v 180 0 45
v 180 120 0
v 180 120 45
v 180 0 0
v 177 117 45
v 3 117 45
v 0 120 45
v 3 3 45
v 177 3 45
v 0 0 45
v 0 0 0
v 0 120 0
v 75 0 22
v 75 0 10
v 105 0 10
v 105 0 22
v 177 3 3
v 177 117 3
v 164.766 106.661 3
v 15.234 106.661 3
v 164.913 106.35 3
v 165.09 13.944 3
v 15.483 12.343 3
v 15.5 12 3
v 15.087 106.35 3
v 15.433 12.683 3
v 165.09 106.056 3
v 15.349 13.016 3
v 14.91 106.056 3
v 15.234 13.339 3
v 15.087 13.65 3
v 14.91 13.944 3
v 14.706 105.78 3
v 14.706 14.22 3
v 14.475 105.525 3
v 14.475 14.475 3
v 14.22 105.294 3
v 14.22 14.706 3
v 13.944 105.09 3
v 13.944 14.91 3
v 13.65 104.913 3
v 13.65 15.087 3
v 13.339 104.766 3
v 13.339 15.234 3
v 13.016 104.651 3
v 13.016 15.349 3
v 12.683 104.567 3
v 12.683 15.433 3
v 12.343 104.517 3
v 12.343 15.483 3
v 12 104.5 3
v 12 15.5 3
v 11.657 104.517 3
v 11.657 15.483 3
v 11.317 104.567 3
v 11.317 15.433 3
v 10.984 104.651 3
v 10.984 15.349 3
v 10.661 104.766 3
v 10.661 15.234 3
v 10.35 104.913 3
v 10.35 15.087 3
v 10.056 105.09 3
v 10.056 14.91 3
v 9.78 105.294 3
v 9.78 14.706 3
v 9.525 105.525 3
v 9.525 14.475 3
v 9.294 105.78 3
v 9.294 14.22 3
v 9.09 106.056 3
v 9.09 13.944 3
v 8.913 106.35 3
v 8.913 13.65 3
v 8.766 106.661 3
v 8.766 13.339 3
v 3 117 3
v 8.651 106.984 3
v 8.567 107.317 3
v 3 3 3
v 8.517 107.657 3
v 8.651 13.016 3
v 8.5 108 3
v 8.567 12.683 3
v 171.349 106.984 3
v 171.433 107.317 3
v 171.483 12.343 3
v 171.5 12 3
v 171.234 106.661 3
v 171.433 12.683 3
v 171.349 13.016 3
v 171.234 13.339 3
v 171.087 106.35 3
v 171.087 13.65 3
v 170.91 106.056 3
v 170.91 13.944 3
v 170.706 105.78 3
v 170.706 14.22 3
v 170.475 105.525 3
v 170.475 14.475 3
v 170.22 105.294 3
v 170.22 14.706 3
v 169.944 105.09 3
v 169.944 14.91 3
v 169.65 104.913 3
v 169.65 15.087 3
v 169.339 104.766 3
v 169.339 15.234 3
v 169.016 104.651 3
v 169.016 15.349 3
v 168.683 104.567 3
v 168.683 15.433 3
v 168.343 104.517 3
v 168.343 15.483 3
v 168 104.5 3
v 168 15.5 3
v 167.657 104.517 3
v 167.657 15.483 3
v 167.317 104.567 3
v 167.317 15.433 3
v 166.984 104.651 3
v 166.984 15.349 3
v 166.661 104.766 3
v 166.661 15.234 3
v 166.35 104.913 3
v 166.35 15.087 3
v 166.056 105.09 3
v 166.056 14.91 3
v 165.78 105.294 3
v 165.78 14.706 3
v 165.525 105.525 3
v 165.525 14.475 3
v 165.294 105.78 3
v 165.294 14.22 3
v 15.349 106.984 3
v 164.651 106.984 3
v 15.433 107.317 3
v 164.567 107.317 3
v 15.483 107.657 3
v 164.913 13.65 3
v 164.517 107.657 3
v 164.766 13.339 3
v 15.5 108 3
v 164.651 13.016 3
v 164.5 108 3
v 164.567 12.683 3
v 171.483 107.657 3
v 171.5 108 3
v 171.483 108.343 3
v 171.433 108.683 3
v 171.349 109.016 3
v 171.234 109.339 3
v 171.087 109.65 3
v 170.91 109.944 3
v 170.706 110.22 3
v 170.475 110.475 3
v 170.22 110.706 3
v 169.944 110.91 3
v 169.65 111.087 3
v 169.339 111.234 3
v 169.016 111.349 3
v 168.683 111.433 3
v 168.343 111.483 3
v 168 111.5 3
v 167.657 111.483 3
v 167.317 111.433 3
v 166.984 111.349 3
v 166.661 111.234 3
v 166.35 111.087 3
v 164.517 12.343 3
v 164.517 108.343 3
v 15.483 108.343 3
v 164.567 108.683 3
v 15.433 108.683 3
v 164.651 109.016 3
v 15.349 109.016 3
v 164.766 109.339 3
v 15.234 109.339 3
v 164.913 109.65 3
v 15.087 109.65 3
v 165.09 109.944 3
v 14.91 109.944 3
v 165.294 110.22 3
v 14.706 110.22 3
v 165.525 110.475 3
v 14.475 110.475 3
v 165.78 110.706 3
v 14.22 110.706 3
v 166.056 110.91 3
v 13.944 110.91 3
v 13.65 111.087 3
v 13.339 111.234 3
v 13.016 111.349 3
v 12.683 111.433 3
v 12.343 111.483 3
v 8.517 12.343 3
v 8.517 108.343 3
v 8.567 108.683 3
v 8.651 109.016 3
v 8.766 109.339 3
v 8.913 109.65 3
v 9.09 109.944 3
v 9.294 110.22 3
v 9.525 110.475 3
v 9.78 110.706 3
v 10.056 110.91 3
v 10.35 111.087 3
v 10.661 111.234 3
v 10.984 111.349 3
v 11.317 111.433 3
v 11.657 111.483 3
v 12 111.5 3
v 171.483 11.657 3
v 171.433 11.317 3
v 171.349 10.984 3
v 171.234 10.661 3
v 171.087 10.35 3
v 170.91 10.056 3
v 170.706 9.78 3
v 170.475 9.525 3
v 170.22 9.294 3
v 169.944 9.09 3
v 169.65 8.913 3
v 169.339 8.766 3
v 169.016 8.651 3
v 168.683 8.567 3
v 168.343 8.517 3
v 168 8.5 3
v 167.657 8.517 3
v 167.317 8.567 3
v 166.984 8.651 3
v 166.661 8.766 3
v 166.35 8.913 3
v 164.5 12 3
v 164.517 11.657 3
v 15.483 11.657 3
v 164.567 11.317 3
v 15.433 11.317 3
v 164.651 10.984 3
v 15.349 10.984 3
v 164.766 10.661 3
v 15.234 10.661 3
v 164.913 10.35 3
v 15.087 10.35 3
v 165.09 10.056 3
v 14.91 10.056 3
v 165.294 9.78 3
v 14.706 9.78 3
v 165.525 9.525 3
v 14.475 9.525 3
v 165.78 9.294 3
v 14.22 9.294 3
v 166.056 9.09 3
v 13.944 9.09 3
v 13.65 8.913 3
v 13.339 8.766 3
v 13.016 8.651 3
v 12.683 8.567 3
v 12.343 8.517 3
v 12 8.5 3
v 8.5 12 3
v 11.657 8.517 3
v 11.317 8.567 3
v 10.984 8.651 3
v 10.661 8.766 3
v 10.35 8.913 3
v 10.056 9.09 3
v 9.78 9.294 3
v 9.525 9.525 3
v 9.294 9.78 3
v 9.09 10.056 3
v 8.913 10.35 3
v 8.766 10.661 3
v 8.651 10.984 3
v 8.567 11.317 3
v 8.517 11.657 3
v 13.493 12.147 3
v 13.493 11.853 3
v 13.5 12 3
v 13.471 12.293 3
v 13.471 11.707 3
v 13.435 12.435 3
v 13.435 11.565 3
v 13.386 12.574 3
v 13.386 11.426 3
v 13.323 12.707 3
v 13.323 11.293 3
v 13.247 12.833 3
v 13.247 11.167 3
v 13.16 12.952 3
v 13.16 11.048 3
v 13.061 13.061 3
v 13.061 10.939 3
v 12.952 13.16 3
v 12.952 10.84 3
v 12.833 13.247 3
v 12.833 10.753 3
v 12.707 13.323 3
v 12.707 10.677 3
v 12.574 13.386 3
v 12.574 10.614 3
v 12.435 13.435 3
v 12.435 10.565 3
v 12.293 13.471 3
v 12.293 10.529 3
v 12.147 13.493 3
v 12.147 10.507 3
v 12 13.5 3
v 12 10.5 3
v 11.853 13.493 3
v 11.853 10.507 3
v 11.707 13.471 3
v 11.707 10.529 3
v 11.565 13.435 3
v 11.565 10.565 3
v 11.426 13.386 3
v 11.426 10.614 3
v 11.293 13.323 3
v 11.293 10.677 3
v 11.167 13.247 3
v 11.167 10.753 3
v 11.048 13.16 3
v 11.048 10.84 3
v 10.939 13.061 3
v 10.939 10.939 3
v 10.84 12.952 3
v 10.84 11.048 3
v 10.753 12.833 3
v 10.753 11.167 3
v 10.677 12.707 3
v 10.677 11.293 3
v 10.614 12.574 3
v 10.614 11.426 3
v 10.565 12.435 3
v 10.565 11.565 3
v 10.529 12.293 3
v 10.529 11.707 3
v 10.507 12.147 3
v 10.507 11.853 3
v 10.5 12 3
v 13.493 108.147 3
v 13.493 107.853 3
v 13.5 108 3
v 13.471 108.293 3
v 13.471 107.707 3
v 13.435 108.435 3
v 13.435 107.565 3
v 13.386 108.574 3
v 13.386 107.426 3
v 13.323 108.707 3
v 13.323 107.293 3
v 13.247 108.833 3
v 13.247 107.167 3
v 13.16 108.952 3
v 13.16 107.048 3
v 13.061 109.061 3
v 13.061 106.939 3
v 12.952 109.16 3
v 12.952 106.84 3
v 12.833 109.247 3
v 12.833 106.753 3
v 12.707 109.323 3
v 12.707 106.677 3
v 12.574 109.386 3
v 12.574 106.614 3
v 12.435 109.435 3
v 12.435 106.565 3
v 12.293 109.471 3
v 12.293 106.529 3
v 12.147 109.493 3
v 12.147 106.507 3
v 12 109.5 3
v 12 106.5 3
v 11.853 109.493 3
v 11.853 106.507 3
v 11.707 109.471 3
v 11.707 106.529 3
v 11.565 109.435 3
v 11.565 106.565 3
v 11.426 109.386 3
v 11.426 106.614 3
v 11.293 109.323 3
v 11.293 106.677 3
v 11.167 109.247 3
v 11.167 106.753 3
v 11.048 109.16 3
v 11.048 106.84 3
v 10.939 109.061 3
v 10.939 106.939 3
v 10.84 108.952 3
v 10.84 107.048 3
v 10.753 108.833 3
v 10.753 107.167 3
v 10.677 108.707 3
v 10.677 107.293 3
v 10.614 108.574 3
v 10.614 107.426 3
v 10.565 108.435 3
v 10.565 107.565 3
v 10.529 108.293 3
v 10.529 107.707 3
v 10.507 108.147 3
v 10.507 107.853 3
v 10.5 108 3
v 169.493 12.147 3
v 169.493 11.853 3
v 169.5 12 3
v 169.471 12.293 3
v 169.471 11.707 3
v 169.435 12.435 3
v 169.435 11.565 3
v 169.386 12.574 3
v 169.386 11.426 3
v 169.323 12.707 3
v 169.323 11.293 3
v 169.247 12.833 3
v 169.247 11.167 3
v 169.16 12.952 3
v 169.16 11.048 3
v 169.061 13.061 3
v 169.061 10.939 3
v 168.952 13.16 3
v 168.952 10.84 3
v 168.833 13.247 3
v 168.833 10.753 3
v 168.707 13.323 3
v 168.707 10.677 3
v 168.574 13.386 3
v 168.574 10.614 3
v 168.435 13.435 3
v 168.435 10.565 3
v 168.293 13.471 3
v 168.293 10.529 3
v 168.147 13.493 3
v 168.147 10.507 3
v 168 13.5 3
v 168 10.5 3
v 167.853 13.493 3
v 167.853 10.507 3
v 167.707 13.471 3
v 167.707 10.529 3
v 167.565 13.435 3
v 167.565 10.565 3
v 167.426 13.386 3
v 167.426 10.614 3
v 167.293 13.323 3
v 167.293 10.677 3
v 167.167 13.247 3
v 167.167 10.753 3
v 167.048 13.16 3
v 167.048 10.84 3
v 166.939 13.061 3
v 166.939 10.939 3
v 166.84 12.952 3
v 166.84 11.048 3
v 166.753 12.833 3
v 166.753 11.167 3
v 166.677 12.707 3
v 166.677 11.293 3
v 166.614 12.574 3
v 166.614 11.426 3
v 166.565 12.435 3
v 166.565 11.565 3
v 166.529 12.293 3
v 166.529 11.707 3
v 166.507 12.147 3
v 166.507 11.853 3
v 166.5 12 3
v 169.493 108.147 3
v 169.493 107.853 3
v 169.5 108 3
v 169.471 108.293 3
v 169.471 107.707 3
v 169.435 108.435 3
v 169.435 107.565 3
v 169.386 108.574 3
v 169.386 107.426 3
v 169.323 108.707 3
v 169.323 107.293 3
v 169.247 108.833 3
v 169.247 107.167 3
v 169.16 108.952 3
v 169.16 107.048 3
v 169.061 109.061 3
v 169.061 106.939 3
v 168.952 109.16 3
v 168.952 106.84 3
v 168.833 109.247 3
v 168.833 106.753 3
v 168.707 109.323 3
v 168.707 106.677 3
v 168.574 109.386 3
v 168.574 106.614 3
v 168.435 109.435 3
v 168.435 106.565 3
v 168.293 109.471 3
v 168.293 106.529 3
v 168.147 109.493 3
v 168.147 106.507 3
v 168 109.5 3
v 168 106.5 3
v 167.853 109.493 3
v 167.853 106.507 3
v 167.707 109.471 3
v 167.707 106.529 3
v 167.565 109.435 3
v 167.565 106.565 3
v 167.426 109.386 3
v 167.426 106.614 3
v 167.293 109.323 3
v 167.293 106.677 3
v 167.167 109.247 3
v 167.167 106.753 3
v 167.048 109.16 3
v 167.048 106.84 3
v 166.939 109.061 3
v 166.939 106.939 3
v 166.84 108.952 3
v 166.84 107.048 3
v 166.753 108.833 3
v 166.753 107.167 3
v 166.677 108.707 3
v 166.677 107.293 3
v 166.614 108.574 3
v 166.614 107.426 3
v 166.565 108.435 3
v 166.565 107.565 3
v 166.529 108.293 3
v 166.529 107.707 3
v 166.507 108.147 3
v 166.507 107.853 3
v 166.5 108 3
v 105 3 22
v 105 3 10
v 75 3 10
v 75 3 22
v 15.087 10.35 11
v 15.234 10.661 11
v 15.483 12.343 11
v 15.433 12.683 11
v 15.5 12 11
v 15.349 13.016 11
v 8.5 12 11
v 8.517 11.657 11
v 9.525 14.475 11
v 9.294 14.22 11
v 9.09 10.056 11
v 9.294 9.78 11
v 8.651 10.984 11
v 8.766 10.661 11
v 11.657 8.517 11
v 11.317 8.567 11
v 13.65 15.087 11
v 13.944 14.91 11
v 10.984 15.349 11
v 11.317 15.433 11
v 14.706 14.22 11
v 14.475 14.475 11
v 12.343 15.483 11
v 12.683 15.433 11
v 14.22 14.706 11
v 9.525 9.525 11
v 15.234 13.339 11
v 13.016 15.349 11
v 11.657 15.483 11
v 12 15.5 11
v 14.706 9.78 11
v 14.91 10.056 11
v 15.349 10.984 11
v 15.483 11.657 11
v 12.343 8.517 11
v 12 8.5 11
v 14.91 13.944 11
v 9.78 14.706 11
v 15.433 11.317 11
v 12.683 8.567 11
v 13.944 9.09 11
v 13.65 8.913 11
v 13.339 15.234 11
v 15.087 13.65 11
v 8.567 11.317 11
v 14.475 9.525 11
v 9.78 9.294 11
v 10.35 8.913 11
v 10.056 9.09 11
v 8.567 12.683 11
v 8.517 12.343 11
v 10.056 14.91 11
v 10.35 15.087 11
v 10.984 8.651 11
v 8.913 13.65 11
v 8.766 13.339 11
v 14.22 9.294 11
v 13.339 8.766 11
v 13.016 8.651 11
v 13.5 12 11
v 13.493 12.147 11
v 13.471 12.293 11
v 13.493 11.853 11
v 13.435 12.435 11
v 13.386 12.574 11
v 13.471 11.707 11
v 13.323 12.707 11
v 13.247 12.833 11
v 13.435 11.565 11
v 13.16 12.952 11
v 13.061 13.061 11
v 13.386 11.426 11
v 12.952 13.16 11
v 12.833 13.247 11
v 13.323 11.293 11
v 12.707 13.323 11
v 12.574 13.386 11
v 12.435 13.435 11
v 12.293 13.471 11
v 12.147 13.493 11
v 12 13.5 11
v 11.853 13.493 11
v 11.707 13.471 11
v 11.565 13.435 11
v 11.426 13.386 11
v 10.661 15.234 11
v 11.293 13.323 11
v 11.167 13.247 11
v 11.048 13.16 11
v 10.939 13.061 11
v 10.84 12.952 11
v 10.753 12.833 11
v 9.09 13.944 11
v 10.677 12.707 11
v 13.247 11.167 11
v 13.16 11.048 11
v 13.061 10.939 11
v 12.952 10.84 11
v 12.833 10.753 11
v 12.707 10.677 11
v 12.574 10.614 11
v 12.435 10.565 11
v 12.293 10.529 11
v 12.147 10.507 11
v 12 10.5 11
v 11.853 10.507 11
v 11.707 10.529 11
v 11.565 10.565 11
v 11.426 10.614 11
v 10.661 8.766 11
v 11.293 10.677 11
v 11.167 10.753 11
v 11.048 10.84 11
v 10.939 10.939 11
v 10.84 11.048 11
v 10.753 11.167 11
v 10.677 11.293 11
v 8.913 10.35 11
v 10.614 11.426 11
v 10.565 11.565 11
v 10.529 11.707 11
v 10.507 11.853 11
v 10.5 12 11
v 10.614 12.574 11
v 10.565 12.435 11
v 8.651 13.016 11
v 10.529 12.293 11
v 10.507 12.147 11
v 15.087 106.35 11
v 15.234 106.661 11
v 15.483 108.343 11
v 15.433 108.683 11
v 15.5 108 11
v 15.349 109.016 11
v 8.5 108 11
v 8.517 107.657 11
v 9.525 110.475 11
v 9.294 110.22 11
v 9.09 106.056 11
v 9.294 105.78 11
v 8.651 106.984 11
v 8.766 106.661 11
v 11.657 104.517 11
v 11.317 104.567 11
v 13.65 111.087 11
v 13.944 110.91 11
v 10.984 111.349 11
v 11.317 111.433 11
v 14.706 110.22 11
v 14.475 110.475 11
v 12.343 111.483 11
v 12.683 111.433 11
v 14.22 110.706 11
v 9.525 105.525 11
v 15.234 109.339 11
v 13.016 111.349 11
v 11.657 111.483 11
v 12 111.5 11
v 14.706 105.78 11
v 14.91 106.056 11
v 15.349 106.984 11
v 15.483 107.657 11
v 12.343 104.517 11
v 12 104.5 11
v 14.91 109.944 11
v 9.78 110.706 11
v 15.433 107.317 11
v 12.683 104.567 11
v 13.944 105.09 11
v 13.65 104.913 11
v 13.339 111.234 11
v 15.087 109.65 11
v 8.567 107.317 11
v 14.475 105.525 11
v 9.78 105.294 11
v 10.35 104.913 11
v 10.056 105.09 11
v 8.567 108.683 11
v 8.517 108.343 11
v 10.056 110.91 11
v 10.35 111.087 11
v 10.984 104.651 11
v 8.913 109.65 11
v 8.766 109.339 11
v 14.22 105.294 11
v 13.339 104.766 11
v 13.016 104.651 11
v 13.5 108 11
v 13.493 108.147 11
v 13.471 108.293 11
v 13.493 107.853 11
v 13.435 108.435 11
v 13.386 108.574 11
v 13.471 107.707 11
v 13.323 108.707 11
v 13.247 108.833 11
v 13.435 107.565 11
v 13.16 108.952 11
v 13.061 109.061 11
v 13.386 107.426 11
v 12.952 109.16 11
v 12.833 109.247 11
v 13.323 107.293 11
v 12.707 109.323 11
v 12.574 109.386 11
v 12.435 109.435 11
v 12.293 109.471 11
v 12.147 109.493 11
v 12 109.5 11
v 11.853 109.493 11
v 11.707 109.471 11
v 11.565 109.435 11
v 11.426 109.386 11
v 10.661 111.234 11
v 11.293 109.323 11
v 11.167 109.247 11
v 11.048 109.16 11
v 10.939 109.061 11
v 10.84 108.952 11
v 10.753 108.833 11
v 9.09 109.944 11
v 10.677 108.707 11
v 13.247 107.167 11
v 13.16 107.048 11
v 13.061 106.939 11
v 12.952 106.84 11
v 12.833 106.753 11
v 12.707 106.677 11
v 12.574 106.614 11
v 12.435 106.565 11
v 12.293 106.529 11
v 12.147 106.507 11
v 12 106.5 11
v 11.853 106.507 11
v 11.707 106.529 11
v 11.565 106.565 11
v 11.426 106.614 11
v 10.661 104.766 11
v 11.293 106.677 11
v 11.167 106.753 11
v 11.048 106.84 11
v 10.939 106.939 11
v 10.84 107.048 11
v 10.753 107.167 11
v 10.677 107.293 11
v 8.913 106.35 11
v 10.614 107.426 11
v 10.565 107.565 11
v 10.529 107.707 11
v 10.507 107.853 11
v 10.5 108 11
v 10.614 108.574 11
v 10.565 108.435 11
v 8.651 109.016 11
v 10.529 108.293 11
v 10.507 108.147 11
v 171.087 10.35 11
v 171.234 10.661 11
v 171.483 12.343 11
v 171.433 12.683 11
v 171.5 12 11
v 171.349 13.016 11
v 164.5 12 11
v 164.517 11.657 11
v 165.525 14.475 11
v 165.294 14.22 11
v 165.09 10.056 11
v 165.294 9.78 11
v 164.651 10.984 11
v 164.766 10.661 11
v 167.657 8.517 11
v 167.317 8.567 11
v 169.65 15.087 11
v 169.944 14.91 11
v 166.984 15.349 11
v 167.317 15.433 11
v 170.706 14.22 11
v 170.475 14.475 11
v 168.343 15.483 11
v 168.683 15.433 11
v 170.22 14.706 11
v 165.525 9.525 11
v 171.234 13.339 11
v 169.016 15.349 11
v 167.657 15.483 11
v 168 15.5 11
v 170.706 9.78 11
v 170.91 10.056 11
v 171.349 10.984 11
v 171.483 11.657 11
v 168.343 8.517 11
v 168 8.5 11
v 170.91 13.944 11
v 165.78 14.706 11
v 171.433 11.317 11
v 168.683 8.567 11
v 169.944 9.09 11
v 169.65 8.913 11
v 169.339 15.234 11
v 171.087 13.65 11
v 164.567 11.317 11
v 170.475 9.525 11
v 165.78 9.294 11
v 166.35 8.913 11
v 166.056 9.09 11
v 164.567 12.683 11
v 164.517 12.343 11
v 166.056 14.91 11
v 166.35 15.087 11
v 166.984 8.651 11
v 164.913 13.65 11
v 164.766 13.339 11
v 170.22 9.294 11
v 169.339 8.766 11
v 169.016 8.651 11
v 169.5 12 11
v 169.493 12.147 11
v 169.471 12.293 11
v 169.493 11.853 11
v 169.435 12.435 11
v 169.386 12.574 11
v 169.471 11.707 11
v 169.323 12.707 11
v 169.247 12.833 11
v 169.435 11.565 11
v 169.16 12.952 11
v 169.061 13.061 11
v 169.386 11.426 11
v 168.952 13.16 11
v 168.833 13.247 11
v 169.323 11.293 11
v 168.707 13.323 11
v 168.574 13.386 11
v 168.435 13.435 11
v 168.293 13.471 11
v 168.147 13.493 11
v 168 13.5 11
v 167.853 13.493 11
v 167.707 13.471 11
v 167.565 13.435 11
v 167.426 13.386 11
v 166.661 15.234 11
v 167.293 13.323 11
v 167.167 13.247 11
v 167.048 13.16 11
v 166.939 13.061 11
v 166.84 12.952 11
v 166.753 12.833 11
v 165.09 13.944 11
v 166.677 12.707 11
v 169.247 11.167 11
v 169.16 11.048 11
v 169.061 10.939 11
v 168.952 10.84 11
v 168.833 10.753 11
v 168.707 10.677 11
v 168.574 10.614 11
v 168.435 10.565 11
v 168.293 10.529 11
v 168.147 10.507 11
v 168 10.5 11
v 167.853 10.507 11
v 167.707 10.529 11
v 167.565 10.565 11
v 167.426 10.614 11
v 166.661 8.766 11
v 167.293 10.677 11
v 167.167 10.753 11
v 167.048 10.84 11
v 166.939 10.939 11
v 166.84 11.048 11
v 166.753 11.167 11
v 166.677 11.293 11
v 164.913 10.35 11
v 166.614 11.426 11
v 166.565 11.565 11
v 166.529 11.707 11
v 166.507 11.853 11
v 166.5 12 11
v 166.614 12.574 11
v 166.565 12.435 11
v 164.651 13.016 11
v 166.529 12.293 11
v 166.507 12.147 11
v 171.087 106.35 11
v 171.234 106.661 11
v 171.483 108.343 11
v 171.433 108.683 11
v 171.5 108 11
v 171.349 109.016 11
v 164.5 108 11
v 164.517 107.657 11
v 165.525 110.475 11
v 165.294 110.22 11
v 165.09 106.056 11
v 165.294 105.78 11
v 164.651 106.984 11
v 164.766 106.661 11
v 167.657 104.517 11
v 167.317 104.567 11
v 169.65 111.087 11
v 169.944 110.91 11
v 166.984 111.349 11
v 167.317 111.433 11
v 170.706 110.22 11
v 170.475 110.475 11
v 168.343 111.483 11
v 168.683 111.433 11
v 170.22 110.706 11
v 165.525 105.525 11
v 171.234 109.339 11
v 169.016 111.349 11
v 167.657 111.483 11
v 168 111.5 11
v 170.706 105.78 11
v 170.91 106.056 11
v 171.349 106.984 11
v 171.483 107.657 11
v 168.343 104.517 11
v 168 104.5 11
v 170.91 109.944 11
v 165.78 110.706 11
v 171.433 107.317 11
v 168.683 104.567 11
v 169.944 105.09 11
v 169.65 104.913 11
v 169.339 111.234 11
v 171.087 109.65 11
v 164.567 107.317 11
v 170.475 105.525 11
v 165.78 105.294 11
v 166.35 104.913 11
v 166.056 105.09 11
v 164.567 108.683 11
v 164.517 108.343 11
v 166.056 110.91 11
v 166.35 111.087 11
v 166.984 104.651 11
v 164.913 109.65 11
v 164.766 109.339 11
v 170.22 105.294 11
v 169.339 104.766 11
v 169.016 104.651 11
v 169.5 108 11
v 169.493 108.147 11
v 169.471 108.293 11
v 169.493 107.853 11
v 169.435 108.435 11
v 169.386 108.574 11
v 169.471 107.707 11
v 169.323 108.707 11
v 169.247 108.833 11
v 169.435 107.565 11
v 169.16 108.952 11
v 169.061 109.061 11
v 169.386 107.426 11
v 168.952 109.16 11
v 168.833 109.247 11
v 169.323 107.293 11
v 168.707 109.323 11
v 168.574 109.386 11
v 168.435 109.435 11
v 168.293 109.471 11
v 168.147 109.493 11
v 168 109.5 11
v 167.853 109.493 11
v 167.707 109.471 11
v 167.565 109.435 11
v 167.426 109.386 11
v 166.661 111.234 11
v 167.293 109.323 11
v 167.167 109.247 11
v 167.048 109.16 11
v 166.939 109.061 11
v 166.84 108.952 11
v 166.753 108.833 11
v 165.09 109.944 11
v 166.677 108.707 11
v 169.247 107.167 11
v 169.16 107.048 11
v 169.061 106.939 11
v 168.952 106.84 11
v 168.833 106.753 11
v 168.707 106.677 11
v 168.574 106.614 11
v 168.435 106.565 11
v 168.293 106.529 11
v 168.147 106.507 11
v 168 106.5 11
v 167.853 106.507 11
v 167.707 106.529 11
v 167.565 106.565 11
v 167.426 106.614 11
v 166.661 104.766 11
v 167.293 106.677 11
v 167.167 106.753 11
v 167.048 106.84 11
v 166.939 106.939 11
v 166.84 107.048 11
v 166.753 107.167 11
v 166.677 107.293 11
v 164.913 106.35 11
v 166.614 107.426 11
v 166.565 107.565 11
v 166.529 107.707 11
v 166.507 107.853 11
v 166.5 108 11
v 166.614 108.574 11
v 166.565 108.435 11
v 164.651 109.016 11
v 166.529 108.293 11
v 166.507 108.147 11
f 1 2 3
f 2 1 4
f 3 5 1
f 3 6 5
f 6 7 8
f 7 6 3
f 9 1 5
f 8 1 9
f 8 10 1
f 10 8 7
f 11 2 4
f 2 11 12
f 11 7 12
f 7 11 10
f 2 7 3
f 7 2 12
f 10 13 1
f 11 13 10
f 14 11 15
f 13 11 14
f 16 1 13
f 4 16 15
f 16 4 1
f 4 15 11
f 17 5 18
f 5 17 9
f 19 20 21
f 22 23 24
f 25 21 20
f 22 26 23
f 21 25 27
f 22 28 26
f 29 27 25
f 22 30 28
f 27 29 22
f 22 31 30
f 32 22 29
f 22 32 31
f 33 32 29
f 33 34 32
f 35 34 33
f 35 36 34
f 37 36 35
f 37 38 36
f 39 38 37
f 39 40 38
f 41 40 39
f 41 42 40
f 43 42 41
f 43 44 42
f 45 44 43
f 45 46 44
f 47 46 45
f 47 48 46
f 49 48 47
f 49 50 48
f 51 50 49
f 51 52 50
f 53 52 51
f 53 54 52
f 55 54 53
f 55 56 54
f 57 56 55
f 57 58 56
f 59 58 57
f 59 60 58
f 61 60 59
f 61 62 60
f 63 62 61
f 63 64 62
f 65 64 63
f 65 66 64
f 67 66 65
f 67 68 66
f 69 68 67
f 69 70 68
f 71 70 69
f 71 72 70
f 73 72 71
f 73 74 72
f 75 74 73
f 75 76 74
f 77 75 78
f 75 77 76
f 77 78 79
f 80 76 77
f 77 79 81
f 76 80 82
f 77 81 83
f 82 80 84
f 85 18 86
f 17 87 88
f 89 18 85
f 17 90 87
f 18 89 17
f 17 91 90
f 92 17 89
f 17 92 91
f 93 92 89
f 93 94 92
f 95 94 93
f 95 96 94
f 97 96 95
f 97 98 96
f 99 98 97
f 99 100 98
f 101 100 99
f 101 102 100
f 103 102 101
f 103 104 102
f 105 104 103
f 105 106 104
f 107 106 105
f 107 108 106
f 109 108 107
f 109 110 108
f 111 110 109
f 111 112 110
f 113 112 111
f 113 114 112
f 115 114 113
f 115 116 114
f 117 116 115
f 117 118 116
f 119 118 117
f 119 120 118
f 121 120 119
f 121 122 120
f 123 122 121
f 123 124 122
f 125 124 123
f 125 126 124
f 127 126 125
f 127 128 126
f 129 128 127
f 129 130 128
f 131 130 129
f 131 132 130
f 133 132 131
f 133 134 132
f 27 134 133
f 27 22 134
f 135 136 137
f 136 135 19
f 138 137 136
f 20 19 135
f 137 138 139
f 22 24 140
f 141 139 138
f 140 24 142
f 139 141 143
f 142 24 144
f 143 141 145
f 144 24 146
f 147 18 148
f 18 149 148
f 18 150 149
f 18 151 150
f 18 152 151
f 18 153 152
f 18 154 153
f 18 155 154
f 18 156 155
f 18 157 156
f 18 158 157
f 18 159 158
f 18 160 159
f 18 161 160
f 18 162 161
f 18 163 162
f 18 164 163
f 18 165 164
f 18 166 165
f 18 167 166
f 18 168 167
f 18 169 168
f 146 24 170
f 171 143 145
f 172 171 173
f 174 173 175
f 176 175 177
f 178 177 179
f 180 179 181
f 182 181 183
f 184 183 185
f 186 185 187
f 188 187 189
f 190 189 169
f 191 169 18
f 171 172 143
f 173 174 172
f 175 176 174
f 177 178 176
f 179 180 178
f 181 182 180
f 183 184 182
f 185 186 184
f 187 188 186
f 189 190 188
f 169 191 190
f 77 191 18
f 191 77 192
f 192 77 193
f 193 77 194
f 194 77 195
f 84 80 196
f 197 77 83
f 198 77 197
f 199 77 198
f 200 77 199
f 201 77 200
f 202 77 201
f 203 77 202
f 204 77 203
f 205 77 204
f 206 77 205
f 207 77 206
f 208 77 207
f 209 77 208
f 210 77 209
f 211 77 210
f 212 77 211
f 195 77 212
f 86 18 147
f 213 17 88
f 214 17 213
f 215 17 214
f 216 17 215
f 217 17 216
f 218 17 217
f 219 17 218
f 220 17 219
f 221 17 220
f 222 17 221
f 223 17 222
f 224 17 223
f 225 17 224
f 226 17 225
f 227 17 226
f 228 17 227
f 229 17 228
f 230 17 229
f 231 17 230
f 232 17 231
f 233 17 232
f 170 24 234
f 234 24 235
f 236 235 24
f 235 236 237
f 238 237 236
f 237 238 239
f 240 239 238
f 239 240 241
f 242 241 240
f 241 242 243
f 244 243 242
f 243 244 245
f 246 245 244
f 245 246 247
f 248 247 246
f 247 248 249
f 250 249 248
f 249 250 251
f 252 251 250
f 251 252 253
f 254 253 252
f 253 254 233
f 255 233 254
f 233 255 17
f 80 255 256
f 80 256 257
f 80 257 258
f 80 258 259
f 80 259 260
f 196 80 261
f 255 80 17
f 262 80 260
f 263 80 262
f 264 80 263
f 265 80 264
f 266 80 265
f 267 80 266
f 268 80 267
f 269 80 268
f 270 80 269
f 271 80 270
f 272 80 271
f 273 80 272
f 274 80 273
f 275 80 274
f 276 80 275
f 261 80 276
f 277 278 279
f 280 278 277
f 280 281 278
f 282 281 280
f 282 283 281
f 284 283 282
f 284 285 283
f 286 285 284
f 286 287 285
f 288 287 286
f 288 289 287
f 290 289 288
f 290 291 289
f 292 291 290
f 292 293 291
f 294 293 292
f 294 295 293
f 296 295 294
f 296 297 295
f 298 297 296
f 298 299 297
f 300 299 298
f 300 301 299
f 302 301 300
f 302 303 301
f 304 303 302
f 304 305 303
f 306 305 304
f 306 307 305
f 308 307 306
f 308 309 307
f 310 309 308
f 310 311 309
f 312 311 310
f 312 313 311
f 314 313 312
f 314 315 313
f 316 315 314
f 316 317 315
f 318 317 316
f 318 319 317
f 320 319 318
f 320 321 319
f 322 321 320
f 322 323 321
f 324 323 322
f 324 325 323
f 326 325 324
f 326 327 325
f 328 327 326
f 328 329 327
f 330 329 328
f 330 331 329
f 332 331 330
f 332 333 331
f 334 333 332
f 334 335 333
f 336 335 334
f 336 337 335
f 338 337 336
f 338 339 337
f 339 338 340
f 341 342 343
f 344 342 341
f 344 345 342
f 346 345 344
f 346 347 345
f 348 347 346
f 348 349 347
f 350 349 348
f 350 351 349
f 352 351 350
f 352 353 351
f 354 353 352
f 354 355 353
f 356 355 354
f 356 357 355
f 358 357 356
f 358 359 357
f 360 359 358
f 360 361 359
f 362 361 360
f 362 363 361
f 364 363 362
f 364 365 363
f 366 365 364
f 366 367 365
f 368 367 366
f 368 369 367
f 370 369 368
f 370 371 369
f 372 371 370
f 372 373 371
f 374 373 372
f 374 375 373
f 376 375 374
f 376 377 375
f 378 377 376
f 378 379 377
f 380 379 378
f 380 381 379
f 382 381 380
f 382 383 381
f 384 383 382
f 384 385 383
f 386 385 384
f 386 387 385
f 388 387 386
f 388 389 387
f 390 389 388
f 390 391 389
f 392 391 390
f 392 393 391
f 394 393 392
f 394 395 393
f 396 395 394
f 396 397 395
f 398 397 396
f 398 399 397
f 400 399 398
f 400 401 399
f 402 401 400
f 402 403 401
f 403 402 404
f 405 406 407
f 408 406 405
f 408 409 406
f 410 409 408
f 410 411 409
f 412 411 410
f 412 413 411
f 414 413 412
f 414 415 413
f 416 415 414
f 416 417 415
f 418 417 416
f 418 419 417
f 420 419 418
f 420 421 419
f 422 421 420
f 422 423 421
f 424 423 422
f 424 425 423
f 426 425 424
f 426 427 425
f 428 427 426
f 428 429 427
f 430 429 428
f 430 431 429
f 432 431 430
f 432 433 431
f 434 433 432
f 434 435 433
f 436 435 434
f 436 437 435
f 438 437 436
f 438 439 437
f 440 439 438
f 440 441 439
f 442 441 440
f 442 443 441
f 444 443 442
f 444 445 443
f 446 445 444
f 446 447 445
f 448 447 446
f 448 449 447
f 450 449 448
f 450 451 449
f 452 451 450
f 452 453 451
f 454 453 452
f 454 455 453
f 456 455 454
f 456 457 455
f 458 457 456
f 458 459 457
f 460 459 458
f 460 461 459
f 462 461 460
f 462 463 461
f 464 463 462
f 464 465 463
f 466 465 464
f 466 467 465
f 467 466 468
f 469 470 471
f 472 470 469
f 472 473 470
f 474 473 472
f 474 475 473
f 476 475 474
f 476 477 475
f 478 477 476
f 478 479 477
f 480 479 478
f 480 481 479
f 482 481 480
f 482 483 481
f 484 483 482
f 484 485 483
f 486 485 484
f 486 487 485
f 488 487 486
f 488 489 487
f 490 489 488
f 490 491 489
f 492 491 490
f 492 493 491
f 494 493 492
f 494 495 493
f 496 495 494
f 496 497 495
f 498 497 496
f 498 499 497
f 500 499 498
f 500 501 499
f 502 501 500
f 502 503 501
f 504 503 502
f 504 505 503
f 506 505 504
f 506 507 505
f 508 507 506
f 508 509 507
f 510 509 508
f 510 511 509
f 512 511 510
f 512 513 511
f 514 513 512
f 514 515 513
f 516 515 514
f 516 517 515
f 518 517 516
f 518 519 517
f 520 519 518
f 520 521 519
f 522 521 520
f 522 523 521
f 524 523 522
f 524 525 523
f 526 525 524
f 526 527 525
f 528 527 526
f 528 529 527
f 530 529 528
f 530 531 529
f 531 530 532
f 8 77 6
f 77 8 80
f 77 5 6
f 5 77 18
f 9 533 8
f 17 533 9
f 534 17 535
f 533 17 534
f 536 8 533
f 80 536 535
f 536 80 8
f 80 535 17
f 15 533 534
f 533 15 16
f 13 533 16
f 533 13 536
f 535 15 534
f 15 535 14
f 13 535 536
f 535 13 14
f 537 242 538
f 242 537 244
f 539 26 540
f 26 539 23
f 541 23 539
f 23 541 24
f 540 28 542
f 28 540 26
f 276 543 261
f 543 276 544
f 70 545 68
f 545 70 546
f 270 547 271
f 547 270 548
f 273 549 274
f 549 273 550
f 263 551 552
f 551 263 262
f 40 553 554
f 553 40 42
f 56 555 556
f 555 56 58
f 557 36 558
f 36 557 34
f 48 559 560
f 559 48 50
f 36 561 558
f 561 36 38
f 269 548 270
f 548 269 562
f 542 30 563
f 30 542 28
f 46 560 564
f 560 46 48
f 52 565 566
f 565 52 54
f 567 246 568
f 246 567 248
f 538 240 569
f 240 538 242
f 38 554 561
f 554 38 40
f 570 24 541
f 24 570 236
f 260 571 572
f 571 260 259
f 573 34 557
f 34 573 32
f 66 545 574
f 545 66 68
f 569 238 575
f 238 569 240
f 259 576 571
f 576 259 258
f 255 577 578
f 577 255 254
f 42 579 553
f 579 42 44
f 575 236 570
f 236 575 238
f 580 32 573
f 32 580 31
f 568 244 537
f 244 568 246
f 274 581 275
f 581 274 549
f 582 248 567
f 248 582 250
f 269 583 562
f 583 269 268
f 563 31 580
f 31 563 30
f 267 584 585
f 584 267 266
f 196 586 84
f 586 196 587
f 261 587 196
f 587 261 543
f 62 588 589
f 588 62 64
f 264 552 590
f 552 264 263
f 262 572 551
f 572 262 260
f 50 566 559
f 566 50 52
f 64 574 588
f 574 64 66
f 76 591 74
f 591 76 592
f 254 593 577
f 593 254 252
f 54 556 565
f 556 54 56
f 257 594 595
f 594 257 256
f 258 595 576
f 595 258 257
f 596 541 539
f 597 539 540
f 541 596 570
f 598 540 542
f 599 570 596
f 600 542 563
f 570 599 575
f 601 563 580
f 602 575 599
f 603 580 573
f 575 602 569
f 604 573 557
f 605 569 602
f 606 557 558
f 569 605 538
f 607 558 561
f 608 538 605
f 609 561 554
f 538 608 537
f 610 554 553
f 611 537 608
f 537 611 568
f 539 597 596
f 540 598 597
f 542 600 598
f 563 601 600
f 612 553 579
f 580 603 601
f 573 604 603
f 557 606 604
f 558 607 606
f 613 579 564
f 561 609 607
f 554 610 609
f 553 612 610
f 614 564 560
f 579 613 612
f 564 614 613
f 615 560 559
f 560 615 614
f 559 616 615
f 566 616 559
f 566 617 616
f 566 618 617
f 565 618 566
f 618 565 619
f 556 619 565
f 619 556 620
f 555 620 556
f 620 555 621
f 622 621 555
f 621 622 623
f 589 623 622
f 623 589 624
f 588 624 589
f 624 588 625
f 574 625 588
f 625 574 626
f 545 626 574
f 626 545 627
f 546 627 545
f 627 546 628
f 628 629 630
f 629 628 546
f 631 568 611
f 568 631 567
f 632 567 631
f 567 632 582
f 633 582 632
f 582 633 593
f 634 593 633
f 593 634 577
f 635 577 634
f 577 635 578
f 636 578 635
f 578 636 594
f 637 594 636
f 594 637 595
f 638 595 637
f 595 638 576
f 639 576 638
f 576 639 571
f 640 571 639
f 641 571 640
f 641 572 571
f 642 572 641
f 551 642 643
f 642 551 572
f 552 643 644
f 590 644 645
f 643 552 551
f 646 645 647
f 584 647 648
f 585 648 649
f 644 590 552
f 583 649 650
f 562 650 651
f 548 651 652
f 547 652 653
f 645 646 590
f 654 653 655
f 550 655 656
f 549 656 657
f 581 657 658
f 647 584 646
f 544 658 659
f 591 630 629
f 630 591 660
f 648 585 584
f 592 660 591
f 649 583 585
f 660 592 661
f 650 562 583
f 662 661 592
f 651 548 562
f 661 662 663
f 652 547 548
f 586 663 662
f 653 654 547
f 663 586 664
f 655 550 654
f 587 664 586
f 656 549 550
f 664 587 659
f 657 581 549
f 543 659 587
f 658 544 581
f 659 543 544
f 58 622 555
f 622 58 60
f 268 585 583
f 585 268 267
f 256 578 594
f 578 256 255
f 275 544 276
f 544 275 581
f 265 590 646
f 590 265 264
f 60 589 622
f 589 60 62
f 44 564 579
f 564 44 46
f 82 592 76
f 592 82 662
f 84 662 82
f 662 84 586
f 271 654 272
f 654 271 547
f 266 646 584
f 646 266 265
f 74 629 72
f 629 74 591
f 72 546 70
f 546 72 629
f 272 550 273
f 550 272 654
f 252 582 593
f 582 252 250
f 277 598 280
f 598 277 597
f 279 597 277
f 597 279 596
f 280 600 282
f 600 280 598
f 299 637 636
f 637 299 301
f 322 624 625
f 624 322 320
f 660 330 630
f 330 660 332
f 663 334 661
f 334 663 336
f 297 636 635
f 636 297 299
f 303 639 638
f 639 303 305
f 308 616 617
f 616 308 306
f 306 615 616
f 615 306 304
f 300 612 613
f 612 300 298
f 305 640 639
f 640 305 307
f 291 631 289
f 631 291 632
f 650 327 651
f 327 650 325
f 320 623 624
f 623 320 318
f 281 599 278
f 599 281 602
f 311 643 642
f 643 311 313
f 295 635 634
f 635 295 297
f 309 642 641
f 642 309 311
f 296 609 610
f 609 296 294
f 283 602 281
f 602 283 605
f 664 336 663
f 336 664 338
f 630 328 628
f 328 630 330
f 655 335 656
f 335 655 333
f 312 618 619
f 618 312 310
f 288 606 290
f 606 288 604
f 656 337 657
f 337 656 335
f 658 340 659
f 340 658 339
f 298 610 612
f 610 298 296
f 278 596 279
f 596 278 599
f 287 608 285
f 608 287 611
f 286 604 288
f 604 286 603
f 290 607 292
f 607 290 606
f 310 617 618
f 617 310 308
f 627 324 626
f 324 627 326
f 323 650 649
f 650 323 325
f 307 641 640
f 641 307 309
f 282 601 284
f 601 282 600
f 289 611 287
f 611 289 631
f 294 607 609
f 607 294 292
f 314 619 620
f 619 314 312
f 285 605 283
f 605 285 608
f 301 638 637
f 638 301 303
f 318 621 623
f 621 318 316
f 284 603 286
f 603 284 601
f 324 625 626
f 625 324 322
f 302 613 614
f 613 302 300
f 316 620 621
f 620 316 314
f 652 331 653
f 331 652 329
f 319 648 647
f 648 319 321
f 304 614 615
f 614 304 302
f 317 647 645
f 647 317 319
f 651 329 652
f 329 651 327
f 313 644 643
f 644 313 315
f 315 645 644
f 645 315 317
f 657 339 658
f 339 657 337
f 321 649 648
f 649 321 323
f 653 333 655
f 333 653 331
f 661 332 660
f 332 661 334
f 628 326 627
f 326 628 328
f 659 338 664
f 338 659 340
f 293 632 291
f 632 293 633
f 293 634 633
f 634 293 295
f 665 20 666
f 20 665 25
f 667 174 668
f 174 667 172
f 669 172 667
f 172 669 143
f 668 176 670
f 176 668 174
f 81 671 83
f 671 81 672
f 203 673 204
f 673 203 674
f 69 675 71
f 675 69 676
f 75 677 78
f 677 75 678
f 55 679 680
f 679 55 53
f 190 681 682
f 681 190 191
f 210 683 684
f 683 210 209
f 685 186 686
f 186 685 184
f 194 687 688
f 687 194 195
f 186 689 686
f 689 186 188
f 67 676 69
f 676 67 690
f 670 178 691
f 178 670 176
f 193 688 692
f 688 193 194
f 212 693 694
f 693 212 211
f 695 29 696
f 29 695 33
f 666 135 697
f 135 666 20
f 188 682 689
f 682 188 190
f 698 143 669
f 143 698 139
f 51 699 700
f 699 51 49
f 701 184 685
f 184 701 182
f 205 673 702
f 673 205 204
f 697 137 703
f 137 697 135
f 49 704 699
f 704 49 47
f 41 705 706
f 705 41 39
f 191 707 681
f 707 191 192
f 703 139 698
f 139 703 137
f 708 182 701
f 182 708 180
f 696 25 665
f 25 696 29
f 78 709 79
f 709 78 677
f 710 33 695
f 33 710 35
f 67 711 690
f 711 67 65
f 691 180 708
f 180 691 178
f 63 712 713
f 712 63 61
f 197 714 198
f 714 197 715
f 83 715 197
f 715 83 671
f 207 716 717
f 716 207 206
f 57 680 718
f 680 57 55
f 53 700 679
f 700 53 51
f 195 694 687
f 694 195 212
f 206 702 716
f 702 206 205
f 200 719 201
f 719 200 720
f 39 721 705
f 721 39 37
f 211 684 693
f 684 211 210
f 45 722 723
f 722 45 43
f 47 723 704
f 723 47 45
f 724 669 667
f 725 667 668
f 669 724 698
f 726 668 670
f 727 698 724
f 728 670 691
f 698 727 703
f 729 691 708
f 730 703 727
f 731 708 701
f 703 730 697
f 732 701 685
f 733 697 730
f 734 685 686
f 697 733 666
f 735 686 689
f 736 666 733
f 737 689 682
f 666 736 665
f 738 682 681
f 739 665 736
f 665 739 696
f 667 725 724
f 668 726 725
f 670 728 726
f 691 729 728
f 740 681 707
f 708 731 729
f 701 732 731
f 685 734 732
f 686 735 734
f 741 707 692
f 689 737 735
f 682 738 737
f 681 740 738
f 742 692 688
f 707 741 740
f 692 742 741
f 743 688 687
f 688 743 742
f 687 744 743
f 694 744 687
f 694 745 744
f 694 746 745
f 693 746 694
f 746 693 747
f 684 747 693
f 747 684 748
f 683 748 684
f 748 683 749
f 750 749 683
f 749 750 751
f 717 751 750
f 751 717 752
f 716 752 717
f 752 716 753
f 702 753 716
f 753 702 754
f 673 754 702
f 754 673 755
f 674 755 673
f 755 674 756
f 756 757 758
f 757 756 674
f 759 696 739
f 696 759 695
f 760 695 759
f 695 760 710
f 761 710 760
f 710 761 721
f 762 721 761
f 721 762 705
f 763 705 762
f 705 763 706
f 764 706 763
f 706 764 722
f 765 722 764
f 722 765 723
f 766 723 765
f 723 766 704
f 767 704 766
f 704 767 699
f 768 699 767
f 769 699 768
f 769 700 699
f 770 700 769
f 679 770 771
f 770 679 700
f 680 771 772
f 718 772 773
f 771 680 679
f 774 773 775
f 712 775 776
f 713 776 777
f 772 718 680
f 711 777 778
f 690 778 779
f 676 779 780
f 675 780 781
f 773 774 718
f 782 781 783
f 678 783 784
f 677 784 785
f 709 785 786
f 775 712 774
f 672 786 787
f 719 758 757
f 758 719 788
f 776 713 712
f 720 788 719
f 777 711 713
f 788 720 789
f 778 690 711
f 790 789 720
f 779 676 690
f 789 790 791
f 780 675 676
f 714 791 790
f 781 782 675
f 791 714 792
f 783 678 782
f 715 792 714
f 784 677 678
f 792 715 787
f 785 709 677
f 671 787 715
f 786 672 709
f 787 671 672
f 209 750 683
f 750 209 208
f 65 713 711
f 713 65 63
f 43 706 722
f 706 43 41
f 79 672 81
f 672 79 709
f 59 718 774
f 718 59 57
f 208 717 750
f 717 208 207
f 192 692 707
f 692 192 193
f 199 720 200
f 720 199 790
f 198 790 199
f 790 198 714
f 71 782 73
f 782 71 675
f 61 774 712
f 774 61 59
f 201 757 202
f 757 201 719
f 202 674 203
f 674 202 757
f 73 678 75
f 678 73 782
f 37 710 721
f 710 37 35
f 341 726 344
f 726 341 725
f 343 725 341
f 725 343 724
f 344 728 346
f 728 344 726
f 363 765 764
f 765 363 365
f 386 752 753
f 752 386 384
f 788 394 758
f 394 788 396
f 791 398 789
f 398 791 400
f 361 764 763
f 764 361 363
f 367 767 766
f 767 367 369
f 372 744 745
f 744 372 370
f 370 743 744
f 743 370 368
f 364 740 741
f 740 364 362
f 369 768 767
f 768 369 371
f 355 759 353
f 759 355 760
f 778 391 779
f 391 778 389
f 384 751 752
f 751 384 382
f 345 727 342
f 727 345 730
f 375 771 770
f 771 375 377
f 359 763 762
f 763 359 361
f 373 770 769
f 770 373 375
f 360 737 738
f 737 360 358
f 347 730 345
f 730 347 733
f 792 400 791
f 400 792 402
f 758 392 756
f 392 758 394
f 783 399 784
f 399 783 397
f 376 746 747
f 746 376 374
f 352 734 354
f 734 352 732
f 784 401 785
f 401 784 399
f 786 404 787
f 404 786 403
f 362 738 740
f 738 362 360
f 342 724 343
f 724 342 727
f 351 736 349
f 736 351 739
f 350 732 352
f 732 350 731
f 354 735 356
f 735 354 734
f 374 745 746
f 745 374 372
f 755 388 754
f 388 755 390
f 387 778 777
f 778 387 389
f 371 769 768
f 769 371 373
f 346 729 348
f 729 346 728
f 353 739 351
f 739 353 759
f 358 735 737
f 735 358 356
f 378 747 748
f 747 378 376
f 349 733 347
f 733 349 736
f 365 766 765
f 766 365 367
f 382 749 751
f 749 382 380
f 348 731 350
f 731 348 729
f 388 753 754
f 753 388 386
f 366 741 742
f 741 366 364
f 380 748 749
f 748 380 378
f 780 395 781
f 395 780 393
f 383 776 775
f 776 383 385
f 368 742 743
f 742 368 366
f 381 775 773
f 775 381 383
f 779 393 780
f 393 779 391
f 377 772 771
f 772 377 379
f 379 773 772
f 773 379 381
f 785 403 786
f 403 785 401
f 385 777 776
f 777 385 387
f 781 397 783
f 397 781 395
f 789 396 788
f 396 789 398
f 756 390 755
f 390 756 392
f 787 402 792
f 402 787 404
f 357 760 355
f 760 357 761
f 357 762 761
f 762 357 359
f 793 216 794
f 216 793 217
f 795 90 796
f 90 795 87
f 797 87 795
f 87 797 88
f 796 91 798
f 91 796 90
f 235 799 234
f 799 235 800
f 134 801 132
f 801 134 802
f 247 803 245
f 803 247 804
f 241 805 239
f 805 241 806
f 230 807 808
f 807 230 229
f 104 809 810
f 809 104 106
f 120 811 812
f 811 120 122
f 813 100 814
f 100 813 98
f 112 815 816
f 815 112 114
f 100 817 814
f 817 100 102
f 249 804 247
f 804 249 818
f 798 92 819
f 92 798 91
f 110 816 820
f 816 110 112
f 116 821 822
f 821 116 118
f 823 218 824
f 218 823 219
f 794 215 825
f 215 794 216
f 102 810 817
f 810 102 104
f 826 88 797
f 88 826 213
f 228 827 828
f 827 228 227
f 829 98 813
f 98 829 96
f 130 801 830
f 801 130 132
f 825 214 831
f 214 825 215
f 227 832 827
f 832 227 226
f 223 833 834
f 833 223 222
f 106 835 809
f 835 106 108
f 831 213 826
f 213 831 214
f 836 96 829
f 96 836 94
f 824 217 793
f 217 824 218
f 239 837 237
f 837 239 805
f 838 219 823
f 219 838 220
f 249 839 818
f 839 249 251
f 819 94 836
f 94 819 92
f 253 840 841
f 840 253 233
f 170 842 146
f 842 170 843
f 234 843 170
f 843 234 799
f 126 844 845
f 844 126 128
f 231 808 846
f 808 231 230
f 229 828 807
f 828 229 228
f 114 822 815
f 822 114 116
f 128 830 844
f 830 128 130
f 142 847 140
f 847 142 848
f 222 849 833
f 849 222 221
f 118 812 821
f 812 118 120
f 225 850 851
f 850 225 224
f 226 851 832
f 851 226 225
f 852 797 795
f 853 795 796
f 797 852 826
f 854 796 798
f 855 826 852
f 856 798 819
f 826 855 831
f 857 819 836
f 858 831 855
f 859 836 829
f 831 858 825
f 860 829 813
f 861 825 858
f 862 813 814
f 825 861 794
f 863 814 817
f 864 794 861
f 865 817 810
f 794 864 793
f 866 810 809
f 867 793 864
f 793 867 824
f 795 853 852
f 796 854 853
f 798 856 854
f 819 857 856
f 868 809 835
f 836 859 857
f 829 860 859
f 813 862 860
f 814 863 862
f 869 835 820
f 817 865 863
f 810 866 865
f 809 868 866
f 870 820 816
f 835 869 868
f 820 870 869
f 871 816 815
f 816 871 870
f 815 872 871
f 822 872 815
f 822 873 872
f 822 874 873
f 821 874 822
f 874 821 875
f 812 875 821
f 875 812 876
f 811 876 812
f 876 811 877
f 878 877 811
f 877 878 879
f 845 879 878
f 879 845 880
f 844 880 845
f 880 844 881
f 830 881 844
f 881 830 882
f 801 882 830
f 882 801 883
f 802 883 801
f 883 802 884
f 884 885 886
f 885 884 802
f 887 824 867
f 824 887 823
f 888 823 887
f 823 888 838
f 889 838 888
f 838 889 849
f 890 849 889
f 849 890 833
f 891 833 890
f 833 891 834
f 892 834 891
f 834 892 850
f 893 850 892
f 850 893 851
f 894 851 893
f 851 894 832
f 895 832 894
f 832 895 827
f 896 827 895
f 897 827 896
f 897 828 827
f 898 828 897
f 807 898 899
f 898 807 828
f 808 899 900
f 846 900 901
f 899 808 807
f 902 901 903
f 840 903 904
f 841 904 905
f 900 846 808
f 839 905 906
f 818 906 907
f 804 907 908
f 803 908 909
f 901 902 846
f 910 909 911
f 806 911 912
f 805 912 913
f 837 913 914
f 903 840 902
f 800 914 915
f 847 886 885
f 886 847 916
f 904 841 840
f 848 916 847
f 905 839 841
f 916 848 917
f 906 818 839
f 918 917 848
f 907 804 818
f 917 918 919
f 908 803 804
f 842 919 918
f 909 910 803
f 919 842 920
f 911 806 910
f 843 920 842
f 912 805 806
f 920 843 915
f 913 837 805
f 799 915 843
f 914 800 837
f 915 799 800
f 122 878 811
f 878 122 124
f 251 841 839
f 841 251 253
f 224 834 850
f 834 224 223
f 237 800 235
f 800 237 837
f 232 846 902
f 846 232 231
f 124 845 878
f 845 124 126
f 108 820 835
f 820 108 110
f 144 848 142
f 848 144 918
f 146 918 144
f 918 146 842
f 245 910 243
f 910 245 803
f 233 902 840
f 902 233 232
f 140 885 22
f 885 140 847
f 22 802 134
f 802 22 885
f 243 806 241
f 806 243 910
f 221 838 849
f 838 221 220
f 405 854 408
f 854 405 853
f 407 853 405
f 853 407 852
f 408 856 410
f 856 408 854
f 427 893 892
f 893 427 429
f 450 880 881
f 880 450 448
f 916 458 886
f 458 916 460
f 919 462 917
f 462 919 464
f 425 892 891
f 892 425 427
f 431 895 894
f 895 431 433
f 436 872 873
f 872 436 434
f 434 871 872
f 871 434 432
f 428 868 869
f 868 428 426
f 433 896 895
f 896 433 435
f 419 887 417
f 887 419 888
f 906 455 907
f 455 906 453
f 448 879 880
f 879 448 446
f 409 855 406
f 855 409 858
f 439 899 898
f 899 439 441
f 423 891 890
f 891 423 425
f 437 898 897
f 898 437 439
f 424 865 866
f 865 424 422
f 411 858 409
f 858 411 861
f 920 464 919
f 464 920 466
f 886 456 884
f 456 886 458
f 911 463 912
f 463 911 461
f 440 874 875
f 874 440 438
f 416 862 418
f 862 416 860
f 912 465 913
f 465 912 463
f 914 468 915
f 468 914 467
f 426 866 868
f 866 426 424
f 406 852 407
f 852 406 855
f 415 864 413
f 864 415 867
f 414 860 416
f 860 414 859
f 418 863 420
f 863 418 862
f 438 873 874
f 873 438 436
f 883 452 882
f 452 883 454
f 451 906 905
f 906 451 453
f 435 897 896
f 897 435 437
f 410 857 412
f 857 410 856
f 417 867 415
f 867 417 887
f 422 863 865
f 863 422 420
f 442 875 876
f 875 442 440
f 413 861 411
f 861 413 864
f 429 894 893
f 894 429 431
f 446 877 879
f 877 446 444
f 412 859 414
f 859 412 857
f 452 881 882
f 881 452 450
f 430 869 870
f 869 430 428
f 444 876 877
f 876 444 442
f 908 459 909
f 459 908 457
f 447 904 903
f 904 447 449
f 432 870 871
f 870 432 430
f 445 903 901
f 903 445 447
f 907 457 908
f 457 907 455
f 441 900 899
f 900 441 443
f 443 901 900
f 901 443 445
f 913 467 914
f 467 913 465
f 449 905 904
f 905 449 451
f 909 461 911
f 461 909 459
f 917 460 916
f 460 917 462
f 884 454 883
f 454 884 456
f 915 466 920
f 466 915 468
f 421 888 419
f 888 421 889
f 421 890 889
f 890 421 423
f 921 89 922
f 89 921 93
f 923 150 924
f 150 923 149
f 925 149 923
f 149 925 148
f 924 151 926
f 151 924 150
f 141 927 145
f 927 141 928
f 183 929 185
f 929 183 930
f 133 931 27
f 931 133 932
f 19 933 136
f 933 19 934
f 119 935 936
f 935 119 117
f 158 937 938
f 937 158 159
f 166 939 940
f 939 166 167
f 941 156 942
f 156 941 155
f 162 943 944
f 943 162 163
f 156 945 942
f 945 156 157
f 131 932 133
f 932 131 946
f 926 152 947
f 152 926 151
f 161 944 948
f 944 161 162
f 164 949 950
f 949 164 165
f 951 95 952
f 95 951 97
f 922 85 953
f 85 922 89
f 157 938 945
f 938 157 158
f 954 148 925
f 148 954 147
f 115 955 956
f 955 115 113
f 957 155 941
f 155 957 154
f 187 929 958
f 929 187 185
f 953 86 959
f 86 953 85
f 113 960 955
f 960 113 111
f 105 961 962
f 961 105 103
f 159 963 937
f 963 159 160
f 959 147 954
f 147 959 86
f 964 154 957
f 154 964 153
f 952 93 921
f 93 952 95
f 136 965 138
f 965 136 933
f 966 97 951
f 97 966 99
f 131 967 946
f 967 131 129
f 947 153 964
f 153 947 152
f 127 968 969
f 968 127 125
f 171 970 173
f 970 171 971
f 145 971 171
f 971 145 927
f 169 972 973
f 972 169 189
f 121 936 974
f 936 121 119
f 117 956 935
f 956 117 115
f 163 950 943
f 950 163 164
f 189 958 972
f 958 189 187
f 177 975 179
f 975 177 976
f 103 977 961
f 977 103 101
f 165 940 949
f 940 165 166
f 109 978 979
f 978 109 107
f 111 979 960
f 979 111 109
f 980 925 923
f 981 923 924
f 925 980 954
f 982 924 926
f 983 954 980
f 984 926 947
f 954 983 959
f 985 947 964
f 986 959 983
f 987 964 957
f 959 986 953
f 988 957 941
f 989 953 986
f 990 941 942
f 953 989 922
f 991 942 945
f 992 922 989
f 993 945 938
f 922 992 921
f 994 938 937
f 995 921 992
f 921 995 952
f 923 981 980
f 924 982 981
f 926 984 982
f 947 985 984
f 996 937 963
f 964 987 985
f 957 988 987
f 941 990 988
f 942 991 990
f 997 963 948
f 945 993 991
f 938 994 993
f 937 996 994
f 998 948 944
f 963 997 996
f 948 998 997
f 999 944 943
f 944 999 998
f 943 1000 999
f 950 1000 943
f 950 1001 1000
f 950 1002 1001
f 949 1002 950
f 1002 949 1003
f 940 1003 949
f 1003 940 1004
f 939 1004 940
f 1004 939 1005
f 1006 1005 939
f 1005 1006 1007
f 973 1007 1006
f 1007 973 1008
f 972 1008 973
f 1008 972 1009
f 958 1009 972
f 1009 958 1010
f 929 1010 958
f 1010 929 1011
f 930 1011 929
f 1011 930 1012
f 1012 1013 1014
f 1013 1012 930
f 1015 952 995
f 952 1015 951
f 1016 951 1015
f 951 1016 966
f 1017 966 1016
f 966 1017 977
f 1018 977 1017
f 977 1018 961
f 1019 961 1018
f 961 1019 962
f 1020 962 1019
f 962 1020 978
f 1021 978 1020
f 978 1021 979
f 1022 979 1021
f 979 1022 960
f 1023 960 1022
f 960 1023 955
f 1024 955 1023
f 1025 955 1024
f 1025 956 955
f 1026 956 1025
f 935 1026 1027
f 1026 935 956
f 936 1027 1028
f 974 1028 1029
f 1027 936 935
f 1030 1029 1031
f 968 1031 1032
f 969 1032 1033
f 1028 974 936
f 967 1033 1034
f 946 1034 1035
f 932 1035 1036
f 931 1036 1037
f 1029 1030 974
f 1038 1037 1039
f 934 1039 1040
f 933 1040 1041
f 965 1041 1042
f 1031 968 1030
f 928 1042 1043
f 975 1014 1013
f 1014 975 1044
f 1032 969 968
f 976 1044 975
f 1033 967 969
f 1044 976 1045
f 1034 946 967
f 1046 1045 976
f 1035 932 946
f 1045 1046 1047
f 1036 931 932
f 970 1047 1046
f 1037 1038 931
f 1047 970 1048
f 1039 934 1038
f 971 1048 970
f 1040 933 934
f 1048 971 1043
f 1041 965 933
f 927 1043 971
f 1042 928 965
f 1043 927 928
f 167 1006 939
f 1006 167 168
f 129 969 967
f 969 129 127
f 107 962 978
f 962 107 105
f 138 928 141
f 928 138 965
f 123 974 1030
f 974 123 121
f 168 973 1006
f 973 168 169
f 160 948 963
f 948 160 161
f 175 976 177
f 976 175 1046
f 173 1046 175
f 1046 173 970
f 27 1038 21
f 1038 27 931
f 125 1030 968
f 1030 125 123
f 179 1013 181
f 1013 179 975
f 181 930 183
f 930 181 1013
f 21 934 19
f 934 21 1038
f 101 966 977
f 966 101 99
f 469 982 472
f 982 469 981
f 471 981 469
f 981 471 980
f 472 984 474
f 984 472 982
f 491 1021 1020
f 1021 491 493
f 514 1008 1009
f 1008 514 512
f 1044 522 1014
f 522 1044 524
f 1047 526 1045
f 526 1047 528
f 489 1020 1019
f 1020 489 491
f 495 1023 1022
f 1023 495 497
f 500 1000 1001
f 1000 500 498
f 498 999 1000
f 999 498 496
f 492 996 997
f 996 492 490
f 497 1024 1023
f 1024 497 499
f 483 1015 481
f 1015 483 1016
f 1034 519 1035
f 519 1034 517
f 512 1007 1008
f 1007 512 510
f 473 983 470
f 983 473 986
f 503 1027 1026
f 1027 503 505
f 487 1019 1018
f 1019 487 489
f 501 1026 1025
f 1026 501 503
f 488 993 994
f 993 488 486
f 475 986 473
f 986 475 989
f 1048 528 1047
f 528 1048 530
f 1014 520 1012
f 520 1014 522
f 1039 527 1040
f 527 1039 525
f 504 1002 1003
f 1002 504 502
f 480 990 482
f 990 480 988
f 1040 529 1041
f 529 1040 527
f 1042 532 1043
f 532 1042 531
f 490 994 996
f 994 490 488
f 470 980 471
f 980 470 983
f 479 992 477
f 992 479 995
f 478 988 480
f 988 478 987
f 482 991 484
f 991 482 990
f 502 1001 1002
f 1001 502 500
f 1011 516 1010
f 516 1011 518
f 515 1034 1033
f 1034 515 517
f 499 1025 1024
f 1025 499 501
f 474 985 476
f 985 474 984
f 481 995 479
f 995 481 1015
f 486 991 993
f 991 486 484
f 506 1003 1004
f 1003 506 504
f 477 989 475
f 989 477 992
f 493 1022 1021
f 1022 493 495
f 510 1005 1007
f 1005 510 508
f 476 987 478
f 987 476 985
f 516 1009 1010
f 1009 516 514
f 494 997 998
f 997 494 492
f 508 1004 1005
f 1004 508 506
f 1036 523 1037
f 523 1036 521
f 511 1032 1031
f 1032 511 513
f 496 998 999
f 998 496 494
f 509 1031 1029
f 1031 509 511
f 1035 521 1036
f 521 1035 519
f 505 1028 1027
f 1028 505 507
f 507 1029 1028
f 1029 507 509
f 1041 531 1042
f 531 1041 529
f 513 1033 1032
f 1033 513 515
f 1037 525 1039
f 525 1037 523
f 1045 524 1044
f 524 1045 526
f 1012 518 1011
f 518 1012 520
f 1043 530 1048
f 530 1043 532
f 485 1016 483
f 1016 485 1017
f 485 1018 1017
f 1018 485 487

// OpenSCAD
// SMART FOREST FIRE ALERT SYSTEM
// 3D Enclosure CAD Model
// Units: millimeters

$fn = 64;

// Main dimensions
length = 180;
width = 120;
height = 45;
wall = 3;
base_thickness = 3;

// Mounting settings
post_diameter = 7;
hole_diameter = 3;
post_height = 8;

// Enclosure base
module enclosure_base() {
    difference() {
        // Outer box
        cube([length, width, height]);

        // Hollow interior
        translate([wall, wall, base_thickness])
            cube([
                length - 2*wall,
                width - 2*wall,
                height
            ]);

        // Cable opening
        translate([length/2 - 15, -1, 10])
            cube([30, wall + 2, 12]);
    }

    // Four mounting posts
    for (x = [12, length - 12]) {
        for (y = [12, width - 12]) {
            translate([x, y, base_thickness])
                difference() {
                    cylinder(
                        h = post_height,
                        d = post_diameter
                    );

                    translate([0, 0, -1])
                        cylinder(
                            h = post_height + 2,
                            d = hole_diameter
                        );
                }
        }
    }
}

// Separate lid
module enclosure_lid() {
    difference() {
        cube([length, width, 3]);

        // Screw holes
        for (x = [12, length - 12]) {
            for (y = [12, width - 12]) {
                translate([x, y, -1])
                    cylinder(h = 5, d = hole_diameter);
            }
        }
    }
}

// Choose which part to display:
// "base" = enclosure base
// "lid"  = enclosure lid

part = "base";

if (part == "base") {
    enclosure_base();
} else {
    enclosure_lid();
}
